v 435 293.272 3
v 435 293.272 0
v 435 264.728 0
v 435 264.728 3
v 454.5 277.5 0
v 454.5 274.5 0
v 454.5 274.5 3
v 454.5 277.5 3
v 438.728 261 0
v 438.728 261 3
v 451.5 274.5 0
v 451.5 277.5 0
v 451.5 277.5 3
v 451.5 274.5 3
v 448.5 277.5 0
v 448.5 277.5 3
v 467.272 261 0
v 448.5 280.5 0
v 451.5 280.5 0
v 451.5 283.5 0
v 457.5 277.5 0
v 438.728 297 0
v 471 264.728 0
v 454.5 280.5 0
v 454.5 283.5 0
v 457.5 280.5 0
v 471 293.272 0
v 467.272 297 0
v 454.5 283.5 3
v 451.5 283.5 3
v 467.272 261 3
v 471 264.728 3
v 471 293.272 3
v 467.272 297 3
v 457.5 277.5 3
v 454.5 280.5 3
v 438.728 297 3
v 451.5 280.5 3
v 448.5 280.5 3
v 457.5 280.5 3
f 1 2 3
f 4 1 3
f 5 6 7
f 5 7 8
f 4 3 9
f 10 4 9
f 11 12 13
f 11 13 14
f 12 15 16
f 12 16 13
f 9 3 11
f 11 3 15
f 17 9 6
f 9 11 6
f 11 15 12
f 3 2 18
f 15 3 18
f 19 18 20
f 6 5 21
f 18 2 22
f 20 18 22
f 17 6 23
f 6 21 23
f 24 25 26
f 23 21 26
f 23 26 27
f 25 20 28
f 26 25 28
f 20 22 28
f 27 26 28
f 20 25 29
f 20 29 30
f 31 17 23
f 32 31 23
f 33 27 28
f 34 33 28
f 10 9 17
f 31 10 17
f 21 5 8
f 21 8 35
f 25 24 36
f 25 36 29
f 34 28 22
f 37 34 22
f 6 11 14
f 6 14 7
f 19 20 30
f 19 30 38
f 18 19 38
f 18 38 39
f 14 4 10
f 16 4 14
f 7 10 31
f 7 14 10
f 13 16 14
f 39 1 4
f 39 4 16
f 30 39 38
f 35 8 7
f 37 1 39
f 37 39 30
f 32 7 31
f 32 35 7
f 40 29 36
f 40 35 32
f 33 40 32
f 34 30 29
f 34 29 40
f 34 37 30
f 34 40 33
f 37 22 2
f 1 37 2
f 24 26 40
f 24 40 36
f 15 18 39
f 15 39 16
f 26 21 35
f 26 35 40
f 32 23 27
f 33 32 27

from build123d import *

# Parameters (mm, degrees)
BOSS_EXTRUDE1_DEPTH = 3


with BuildPart() as part:
    # Sketch1 → Boss-Extrude1 (new body)
    with BuildSketch(Plane.XY):
        Polygon((471.00000486, 293.272073149), (467.272082799, 296.99999521), (438.727926921, 296.99999521), (435.00000486, 293.272073149), (435.00000486, 264.727917272), (438.727926921, 260.99999521), (467.272082799, 260.99999521), (471.00000486, 264.727917272), align=None)
        Polygon((454.50000486, 274.49999521), (454.50000486, 277.49999521), (457.50000486, 277.49999521), (457.50000486, 280.49999521), (454.50000486, 280.49999521), (454.50000486, 283.49999521), (451.50000486, 283.49999521), (451.50000486, 280.49999521), (448.50000486, 280.49999521), (448.50000486, 277.49999521), (451.50000486, 277.49999521), (451.50000486, 274.49999521), align=None, mode=Mode.SUBTRACT)
    extrude(amount=BOSS_EXTRUDE1_DEPTH)


solid = part.part
